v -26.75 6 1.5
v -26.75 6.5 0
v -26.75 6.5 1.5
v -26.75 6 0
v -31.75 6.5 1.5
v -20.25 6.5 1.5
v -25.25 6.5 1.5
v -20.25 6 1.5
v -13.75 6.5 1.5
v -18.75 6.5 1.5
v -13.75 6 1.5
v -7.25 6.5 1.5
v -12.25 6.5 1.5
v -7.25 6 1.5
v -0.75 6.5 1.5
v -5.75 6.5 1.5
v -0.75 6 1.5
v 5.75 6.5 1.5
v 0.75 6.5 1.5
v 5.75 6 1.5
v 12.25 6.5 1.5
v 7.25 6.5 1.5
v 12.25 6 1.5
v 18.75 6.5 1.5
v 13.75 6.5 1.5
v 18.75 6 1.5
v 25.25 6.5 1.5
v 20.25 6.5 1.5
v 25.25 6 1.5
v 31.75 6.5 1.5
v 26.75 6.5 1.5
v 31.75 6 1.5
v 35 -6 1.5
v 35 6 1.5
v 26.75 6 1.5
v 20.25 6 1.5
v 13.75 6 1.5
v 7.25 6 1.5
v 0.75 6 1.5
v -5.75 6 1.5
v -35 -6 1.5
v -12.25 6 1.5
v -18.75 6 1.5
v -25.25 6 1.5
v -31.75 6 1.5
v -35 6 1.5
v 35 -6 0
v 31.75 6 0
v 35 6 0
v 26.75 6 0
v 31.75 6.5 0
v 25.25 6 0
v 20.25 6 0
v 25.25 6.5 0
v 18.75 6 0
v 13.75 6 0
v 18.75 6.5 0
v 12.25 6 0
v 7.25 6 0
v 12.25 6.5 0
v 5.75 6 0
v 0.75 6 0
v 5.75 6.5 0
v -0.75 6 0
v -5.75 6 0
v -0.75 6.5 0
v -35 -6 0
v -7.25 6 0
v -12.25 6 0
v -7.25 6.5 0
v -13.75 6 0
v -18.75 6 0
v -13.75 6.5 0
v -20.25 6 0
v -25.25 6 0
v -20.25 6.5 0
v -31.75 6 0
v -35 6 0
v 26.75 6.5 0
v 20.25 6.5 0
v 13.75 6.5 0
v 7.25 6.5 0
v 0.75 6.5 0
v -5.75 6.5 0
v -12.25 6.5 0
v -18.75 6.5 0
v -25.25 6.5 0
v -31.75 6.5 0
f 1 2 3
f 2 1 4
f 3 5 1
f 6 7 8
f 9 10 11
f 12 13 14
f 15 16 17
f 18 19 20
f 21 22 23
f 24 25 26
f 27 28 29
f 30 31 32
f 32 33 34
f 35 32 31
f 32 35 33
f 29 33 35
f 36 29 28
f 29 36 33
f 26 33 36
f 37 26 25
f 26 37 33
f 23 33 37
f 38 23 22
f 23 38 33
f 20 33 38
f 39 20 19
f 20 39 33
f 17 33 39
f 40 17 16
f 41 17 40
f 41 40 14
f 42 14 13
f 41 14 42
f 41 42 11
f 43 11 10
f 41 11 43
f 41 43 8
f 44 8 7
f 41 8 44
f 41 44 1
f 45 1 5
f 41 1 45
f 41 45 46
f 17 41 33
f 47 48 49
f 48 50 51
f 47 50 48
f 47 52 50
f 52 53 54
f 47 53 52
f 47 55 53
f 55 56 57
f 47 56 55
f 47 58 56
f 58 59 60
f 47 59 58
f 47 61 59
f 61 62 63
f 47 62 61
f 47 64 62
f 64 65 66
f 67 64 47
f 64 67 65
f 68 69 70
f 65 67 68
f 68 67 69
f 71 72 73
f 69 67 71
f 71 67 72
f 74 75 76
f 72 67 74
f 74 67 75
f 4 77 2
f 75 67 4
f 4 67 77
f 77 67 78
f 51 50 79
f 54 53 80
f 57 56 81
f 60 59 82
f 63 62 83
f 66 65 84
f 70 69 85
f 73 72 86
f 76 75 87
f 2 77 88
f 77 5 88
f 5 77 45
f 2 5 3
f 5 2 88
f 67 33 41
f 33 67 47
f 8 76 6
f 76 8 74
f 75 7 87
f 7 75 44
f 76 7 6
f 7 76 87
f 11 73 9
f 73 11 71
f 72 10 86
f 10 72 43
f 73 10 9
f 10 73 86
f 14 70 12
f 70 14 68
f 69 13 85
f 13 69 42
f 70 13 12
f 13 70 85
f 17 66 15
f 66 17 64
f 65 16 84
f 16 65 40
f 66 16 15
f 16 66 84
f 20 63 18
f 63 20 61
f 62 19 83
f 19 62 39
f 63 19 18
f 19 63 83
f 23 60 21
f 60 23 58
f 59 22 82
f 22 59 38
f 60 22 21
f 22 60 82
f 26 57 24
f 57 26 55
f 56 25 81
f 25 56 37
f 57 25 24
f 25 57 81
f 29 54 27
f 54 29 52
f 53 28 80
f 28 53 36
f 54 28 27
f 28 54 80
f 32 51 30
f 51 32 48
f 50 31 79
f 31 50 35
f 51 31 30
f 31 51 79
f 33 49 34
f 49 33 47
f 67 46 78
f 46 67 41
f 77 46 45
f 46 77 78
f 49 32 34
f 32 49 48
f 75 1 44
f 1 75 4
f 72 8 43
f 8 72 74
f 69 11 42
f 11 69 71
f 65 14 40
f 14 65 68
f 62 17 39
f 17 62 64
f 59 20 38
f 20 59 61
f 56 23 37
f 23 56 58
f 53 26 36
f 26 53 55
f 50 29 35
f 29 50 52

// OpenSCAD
// 10-well comb for casting agarose gels
// Print orientation: flat on bed, teeth pointing down (-Z)

// ---------- Parameters ----------
plate_t      = 1.5;   // plate thickness (Z)
spine_len    = 70;    // spine length (X)
spine_w      = 12;    // spine width (Y)
tooth_w      = 5.0;   // tooth width (X)
tooth_len    = 12;    // tooth length (Y)
tooth_count  = 10;    // number of teeth
tooth_gap    = 1.5;   // gap between neighbouring teeth (X)
overhang     = 0.5;   // tooth extension past spine edge (for clean cut)

$fn = 64;

// ---------- Derived ----------
pitch   = tooth_w + tooth_gap;          // centre-to-centre spacing
x_start = -(tooth_count - 1) * pitch / 2; // first tooth centre (row centred)

// ---------- Model ----------
union() {
    // Spine (back bar)
    translate([-spine_len / 2, -spine_w / 2, 0])
        cube([spine_len, spine_w, plate_t]);

    // Teeth hanging in -Y direction
    for (i = [0 : tooth_count - 1])
        translate([x_start + i * pitch - tooth_w / 2,
                   spine_w / 2 - tooth_len,
                   0])
            cube([tooth_w, tooth_len + overhang, plate_t]);
}
